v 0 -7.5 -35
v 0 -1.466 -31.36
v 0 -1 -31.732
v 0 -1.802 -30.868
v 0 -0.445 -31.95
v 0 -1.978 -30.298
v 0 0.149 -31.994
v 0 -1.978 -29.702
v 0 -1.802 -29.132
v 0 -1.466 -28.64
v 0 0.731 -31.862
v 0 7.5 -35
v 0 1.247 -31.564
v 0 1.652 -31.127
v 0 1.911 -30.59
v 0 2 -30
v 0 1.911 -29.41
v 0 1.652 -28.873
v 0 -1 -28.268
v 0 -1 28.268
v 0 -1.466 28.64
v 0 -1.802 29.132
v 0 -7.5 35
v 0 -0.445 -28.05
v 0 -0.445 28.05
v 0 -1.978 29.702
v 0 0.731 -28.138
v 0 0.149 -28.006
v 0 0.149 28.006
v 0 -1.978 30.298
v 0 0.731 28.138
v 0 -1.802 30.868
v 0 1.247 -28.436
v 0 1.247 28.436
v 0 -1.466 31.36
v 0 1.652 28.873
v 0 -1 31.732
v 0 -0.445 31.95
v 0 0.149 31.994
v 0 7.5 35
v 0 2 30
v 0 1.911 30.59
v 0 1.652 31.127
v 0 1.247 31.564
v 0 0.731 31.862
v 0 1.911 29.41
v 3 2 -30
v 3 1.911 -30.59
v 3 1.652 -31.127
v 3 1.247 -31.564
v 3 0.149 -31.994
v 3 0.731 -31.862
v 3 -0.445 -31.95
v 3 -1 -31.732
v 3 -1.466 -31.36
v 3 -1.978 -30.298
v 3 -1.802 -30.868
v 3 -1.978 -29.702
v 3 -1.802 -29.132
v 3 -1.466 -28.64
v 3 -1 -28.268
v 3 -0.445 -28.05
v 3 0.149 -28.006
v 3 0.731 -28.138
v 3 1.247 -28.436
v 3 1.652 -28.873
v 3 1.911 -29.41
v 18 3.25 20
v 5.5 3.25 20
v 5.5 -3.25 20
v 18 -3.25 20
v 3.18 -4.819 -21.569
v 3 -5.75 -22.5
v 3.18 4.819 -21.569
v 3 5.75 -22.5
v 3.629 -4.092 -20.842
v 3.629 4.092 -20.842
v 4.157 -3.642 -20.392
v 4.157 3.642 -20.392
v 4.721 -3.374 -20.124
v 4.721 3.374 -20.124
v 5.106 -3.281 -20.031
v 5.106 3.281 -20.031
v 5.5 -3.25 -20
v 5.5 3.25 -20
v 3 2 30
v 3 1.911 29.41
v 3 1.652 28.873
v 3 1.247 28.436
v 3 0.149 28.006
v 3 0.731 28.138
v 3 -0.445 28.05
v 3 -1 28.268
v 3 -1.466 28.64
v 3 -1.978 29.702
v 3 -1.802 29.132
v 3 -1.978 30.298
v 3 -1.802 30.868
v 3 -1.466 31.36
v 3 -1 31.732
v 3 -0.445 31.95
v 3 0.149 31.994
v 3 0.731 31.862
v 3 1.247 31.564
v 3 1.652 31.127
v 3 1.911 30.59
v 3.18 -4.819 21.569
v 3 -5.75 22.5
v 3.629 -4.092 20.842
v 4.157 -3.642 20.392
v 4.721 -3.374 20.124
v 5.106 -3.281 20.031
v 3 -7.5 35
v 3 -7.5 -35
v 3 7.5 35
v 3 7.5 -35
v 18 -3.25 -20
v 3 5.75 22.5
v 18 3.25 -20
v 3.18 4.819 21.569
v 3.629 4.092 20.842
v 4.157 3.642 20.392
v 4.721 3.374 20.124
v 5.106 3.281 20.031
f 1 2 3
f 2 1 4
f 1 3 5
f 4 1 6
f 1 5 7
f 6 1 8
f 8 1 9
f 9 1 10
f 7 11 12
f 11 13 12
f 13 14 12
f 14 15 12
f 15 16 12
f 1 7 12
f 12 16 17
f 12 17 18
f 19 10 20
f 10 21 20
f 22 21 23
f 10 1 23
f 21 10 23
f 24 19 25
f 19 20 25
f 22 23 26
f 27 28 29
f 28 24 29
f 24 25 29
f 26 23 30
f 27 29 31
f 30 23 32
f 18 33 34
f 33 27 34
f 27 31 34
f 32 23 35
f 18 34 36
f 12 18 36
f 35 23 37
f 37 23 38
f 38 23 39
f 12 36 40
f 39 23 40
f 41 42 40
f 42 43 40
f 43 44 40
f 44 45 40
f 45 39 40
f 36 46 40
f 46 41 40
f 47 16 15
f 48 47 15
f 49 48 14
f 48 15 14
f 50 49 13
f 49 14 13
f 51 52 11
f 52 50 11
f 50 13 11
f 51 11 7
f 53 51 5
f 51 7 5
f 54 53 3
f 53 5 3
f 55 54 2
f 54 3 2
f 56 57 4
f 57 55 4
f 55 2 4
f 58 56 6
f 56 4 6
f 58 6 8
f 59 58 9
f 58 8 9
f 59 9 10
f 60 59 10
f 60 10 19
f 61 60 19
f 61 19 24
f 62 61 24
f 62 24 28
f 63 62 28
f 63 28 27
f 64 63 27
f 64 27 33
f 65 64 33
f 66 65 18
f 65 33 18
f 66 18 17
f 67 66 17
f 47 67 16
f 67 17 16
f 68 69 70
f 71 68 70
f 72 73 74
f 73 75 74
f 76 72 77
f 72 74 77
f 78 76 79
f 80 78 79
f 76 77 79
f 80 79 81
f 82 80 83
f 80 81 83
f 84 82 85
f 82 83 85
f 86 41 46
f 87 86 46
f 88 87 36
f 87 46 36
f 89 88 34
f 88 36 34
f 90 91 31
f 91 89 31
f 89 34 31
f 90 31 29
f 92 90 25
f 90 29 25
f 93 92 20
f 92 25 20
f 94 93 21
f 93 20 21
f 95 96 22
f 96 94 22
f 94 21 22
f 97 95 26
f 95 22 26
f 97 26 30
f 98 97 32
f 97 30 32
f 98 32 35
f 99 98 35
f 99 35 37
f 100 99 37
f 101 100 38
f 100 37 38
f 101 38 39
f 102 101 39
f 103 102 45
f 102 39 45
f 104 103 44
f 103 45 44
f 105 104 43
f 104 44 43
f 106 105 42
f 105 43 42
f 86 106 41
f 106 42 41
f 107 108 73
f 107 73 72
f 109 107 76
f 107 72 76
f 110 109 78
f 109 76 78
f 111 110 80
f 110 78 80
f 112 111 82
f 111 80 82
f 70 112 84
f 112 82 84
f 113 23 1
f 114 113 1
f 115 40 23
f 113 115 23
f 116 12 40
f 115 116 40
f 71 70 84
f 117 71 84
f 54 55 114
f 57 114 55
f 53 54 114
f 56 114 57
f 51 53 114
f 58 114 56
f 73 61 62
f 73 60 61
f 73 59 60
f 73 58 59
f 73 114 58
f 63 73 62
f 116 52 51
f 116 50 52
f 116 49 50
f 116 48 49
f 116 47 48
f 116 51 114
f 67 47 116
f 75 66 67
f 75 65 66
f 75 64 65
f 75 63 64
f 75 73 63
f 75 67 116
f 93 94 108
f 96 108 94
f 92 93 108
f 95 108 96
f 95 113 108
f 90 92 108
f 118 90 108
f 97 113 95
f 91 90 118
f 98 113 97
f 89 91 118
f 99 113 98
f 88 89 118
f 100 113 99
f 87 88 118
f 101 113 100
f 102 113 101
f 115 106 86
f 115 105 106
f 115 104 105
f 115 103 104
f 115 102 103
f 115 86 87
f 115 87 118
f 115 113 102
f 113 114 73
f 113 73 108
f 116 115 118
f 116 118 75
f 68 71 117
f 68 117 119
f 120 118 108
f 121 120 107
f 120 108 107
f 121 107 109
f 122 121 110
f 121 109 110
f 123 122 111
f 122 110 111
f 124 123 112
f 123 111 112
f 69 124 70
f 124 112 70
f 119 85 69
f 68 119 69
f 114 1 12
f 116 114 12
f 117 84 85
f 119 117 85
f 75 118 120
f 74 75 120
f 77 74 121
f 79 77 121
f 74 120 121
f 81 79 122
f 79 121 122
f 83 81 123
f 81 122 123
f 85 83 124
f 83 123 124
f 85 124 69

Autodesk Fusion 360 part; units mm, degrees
sketch "Boceto1" plane through (0, 0, 0) normal (1, 0, 0) x (0, 1, 0)
  line L0 (7.5, 35) -> (-7.5, 35)
  line L1 (-7.5, 35) -> (-7.5, -35)
  line L2 (-7.5, -35) -> (7.5, -35)
  line L3 (7.5, -35) -> (7.5, 35)
  line L4 (7.5, 35) -> (-7.5, -35) construction
  line L5 (-7.5, 35) -> (7.5, -35) construction
  circle A0 centre (0, 30) radius 2
  circle A1 centre (0, -30) radius 2
  line L6 (0, 35) -> (0, -35) construction
  dimension "d1" = 15
  dimension "d2" = 70
  dimension "d3" = 4
  dimension "d4" = 4
  dimension "d5" = 60
  dimension "d6" = 30
extrude "Extruir1" add sketch "Boceto1" along normal blind 3
sketch "Boceto2" plane through (3, 0, 0) normal (1, 0, 0) x (0, 1, 0)
  circle A0 centre (0, 30) radius 2
  circle A1 centre (0, -30) radius 2
  line L0 (7.5, -35) -> (7.5, 35)
  line L1 (7.5, 35) -> (-7.5, 35)
  line L2 (-7.5, 35) -> (-7.5, -35)
  line L3 (-7.5, -35) -> (7.5, -35)
  line L4 (3.25, 20) -> (-3.25, 20)
  line L5 (-3.25, 20) -> (-3.25, -20)
  line L6 (-3.25, -20) -> (3.25, -20)
  line L7 (3.25, -20) -> (3.25, 20)
  line L8 (3.25, 20) -> (-3.25, -20) construction
  line L9 (-3.25, 20) -> (3.25, -20) construction
  dimension "d9" = 6.5
  dimension "d10" = 40
extrude "Extruir2" add sketch "Boceto2" along normal blind 15 contours L4 L5 L6 L7
fillet "Empalme1" radius 2.5 4 edges at (3, 3.25, 0) (3, 0, -20) (3, -3.25, 0) (3, 0, 20)
